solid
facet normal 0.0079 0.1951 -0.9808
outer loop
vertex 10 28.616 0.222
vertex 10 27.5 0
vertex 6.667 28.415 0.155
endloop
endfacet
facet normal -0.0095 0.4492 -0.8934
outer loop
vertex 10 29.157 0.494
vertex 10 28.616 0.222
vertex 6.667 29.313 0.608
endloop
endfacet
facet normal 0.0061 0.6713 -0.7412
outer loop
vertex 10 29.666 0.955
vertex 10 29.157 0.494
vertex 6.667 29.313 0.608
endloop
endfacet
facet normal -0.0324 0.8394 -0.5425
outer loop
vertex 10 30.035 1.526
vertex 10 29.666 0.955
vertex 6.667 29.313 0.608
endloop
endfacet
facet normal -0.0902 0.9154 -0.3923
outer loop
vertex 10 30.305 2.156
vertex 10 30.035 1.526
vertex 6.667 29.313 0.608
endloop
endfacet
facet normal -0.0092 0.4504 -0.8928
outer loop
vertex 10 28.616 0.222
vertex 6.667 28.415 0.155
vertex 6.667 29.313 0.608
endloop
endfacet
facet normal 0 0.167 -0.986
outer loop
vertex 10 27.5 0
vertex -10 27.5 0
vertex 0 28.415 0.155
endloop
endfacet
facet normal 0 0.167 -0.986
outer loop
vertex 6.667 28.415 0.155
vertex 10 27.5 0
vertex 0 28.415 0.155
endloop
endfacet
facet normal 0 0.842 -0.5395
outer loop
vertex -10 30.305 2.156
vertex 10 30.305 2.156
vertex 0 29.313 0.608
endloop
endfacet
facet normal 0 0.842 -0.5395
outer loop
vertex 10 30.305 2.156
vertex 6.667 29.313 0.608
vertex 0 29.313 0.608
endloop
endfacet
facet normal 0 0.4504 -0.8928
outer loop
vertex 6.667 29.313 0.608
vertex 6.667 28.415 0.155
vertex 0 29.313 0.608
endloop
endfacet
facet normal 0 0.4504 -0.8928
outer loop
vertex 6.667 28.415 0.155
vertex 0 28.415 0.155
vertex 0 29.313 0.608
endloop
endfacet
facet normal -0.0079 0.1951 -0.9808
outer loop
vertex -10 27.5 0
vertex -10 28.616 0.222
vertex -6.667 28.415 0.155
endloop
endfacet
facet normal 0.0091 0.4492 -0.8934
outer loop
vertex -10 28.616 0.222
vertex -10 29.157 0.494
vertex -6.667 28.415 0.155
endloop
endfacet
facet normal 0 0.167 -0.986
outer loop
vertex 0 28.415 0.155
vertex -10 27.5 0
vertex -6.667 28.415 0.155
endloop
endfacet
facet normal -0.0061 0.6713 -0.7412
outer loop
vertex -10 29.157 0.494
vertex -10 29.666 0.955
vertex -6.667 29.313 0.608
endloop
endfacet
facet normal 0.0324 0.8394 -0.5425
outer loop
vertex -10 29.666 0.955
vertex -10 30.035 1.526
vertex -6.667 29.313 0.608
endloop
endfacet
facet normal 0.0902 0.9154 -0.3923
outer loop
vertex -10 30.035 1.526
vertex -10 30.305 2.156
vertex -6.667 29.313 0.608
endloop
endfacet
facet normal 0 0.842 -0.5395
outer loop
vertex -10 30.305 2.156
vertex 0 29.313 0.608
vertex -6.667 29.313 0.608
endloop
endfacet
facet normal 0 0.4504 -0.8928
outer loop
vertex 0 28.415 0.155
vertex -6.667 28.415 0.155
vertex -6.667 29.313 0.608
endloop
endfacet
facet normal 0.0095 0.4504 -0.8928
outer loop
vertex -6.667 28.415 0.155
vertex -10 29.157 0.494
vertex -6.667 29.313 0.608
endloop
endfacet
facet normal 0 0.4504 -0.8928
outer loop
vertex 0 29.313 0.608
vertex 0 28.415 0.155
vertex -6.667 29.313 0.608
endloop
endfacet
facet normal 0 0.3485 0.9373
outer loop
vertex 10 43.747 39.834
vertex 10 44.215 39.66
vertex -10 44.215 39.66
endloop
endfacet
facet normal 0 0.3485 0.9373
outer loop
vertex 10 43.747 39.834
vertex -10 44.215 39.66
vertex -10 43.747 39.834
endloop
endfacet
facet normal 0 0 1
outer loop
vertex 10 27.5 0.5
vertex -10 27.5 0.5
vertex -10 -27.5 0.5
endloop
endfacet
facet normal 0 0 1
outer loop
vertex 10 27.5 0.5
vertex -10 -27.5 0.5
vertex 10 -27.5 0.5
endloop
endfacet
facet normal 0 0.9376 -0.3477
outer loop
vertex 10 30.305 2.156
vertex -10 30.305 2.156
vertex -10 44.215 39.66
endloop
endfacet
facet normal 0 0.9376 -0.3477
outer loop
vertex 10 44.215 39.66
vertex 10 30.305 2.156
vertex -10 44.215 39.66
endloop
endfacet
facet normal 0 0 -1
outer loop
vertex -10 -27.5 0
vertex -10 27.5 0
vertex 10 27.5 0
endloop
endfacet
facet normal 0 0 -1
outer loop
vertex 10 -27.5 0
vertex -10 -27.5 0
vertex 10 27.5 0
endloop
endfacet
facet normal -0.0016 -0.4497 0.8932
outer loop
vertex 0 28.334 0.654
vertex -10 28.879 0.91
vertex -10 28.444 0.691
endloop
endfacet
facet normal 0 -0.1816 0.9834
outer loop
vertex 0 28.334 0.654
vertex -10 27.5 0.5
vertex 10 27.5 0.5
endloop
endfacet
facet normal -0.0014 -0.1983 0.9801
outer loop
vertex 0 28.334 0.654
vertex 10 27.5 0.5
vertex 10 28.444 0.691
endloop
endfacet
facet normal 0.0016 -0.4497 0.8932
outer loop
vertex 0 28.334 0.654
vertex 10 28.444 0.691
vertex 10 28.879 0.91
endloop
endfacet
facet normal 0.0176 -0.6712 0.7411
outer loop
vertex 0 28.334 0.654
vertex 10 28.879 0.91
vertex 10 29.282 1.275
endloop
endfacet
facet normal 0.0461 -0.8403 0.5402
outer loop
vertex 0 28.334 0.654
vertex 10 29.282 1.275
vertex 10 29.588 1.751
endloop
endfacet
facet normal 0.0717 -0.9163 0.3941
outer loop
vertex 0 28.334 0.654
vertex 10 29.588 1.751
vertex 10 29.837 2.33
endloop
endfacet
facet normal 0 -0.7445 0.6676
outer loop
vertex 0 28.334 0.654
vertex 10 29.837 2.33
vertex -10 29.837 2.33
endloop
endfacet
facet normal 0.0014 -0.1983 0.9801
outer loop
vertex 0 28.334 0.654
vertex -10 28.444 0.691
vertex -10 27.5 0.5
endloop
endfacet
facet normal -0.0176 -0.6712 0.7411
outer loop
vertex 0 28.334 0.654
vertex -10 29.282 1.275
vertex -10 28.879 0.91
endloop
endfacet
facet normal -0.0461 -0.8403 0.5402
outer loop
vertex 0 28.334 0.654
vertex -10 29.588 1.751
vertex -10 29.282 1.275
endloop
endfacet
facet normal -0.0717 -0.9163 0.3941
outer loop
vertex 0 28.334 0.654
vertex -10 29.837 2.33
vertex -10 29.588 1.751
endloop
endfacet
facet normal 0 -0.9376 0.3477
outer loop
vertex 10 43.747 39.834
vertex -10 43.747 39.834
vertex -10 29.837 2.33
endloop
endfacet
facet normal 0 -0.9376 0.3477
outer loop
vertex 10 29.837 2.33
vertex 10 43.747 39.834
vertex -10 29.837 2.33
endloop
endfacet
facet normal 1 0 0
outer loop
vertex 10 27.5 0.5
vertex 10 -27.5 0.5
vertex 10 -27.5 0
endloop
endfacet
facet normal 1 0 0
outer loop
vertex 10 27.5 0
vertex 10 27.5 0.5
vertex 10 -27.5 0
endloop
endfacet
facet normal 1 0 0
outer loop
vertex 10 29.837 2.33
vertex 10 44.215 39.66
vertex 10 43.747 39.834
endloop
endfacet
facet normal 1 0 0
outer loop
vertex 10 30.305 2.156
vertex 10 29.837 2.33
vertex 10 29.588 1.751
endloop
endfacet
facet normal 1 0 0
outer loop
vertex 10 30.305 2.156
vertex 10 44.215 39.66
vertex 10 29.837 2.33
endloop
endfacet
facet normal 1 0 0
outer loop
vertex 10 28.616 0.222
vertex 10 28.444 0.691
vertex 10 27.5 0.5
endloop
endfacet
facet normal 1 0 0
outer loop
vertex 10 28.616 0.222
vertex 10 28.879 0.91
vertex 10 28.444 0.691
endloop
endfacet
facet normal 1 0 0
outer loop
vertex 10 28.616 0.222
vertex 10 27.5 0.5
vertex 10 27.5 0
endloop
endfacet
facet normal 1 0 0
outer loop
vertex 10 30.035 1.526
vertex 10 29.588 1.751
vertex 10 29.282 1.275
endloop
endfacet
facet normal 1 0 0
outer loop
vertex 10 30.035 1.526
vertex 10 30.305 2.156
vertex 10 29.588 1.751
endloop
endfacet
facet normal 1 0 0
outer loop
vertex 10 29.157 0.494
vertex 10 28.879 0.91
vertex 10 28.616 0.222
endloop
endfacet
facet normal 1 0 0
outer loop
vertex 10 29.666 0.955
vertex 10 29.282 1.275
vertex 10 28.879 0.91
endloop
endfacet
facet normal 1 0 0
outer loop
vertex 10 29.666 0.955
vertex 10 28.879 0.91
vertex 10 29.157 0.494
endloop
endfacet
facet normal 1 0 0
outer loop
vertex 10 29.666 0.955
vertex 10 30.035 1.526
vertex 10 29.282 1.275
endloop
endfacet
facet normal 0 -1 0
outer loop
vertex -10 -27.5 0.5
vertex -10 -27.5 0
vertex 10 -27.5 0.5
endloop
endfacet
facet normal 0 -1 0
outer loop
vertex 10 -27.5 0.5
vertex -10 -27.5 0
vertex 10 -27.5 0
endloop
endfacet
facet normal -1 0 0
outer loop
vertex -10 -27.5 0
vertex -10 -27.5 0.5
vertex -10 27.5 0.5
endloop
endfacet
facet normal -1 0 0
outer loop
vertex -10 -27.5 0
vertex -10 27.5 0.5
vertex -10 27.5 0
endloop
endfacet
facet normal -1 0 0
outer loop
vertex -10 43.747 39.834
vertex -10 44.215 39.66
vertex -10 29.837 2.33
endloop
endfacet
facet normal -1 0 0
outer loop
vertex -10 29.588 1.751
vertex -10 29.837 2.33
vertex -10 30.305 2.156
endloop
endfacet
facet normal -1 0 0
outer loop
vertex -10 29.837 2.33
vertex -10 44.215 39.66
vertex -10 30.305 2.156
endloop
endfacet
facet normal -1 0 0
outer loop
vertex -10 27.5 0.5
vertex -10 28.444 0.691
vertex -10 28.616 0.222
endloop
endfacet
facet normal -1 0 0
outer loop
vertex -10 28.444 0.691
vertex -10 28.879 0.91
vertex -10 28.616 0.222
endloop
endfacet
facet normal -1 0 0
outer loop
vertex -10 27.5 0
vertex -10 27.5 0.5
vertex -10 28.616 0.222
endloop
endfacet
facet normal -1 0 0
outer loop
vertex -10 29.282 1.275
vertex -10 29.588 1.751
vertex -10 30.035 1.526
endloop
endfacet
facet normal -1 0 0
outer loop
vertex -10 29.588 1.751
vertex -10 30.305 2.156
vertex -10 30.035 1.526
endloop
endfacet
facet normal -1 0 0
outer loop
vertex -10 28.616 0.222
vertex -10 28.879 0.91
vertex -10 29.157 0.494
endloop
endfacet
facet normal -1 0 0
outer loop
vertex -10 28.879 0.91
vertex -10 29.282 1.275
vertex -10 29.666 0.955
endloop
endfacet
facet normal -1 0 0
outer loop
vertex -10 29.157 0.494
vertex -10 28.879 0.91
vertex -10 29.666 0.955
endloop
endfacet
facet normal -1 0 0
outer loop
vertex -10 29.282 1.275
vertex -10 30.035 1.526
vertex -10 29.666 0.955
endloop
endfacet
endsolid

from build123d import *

# Parameters (mm, degrees)
SKETCH_1_W      = 20
SKETCH_1_H      = 55
EXTRUDE_1_DEPTH = 0.5
EXTRUDE_2_DEPTH = 20


with BuildPart() as part:
    # 草图1 → 凸台-拉伸1 (new body)
    with BuildSketch(Plane.XY):
        Rectangle(SKETCH_1_W, SKETCH_1_H)
    extrude(amount=EXTRUDE_1_DEPTH)

    # 草图2 → 凸台-拉伸2 (add)
    with BuildSketch(Plane.ZY.offset(10)):
        with BuildLine():
            Line((2.156267732, 30.305392831), (39.659750235, 44.215417999))
            Line((39.659750235, 44.215417999), (39.833625549, 43.746624468))
            Line((39.833625549, 43.746624468), (2.330143047, 29.8365993))
            add(Edge.make_bspline(
                [(0.5, 27.5), (0.5, 27.655778728), (0.711024801, 29.04730174), (1.493571631, 29.52631533), (2.330143047, 29.8365993)],
                knots=[0, 0, 0, 0, 0.26712767, 1, 1, 1, 1], degree=3))
            Line((0.5, 27.5), (0, 27.5))
            add(Edge.make_bspline(
                [(0, 27.5), (0, 27.638670788), (0.031716688, 27.88649079), (0.142334357, 28.422460253), (0.331831028, 28.912835815), (0.685759589, 29.46438852), (1.285915439, 29.952226685), (1.865336089, 30.197486413), (2.156267732, 30.305392831)],
                knots=[0, 0, 0, 0, 0.125, 0.25, 0.375, 0.5, 0.75, 1, 1, 1, 1], degree=3))
        make_face()
    extrude(amount=-EXTRUDE_2_DEPTH)


solid = part.part
